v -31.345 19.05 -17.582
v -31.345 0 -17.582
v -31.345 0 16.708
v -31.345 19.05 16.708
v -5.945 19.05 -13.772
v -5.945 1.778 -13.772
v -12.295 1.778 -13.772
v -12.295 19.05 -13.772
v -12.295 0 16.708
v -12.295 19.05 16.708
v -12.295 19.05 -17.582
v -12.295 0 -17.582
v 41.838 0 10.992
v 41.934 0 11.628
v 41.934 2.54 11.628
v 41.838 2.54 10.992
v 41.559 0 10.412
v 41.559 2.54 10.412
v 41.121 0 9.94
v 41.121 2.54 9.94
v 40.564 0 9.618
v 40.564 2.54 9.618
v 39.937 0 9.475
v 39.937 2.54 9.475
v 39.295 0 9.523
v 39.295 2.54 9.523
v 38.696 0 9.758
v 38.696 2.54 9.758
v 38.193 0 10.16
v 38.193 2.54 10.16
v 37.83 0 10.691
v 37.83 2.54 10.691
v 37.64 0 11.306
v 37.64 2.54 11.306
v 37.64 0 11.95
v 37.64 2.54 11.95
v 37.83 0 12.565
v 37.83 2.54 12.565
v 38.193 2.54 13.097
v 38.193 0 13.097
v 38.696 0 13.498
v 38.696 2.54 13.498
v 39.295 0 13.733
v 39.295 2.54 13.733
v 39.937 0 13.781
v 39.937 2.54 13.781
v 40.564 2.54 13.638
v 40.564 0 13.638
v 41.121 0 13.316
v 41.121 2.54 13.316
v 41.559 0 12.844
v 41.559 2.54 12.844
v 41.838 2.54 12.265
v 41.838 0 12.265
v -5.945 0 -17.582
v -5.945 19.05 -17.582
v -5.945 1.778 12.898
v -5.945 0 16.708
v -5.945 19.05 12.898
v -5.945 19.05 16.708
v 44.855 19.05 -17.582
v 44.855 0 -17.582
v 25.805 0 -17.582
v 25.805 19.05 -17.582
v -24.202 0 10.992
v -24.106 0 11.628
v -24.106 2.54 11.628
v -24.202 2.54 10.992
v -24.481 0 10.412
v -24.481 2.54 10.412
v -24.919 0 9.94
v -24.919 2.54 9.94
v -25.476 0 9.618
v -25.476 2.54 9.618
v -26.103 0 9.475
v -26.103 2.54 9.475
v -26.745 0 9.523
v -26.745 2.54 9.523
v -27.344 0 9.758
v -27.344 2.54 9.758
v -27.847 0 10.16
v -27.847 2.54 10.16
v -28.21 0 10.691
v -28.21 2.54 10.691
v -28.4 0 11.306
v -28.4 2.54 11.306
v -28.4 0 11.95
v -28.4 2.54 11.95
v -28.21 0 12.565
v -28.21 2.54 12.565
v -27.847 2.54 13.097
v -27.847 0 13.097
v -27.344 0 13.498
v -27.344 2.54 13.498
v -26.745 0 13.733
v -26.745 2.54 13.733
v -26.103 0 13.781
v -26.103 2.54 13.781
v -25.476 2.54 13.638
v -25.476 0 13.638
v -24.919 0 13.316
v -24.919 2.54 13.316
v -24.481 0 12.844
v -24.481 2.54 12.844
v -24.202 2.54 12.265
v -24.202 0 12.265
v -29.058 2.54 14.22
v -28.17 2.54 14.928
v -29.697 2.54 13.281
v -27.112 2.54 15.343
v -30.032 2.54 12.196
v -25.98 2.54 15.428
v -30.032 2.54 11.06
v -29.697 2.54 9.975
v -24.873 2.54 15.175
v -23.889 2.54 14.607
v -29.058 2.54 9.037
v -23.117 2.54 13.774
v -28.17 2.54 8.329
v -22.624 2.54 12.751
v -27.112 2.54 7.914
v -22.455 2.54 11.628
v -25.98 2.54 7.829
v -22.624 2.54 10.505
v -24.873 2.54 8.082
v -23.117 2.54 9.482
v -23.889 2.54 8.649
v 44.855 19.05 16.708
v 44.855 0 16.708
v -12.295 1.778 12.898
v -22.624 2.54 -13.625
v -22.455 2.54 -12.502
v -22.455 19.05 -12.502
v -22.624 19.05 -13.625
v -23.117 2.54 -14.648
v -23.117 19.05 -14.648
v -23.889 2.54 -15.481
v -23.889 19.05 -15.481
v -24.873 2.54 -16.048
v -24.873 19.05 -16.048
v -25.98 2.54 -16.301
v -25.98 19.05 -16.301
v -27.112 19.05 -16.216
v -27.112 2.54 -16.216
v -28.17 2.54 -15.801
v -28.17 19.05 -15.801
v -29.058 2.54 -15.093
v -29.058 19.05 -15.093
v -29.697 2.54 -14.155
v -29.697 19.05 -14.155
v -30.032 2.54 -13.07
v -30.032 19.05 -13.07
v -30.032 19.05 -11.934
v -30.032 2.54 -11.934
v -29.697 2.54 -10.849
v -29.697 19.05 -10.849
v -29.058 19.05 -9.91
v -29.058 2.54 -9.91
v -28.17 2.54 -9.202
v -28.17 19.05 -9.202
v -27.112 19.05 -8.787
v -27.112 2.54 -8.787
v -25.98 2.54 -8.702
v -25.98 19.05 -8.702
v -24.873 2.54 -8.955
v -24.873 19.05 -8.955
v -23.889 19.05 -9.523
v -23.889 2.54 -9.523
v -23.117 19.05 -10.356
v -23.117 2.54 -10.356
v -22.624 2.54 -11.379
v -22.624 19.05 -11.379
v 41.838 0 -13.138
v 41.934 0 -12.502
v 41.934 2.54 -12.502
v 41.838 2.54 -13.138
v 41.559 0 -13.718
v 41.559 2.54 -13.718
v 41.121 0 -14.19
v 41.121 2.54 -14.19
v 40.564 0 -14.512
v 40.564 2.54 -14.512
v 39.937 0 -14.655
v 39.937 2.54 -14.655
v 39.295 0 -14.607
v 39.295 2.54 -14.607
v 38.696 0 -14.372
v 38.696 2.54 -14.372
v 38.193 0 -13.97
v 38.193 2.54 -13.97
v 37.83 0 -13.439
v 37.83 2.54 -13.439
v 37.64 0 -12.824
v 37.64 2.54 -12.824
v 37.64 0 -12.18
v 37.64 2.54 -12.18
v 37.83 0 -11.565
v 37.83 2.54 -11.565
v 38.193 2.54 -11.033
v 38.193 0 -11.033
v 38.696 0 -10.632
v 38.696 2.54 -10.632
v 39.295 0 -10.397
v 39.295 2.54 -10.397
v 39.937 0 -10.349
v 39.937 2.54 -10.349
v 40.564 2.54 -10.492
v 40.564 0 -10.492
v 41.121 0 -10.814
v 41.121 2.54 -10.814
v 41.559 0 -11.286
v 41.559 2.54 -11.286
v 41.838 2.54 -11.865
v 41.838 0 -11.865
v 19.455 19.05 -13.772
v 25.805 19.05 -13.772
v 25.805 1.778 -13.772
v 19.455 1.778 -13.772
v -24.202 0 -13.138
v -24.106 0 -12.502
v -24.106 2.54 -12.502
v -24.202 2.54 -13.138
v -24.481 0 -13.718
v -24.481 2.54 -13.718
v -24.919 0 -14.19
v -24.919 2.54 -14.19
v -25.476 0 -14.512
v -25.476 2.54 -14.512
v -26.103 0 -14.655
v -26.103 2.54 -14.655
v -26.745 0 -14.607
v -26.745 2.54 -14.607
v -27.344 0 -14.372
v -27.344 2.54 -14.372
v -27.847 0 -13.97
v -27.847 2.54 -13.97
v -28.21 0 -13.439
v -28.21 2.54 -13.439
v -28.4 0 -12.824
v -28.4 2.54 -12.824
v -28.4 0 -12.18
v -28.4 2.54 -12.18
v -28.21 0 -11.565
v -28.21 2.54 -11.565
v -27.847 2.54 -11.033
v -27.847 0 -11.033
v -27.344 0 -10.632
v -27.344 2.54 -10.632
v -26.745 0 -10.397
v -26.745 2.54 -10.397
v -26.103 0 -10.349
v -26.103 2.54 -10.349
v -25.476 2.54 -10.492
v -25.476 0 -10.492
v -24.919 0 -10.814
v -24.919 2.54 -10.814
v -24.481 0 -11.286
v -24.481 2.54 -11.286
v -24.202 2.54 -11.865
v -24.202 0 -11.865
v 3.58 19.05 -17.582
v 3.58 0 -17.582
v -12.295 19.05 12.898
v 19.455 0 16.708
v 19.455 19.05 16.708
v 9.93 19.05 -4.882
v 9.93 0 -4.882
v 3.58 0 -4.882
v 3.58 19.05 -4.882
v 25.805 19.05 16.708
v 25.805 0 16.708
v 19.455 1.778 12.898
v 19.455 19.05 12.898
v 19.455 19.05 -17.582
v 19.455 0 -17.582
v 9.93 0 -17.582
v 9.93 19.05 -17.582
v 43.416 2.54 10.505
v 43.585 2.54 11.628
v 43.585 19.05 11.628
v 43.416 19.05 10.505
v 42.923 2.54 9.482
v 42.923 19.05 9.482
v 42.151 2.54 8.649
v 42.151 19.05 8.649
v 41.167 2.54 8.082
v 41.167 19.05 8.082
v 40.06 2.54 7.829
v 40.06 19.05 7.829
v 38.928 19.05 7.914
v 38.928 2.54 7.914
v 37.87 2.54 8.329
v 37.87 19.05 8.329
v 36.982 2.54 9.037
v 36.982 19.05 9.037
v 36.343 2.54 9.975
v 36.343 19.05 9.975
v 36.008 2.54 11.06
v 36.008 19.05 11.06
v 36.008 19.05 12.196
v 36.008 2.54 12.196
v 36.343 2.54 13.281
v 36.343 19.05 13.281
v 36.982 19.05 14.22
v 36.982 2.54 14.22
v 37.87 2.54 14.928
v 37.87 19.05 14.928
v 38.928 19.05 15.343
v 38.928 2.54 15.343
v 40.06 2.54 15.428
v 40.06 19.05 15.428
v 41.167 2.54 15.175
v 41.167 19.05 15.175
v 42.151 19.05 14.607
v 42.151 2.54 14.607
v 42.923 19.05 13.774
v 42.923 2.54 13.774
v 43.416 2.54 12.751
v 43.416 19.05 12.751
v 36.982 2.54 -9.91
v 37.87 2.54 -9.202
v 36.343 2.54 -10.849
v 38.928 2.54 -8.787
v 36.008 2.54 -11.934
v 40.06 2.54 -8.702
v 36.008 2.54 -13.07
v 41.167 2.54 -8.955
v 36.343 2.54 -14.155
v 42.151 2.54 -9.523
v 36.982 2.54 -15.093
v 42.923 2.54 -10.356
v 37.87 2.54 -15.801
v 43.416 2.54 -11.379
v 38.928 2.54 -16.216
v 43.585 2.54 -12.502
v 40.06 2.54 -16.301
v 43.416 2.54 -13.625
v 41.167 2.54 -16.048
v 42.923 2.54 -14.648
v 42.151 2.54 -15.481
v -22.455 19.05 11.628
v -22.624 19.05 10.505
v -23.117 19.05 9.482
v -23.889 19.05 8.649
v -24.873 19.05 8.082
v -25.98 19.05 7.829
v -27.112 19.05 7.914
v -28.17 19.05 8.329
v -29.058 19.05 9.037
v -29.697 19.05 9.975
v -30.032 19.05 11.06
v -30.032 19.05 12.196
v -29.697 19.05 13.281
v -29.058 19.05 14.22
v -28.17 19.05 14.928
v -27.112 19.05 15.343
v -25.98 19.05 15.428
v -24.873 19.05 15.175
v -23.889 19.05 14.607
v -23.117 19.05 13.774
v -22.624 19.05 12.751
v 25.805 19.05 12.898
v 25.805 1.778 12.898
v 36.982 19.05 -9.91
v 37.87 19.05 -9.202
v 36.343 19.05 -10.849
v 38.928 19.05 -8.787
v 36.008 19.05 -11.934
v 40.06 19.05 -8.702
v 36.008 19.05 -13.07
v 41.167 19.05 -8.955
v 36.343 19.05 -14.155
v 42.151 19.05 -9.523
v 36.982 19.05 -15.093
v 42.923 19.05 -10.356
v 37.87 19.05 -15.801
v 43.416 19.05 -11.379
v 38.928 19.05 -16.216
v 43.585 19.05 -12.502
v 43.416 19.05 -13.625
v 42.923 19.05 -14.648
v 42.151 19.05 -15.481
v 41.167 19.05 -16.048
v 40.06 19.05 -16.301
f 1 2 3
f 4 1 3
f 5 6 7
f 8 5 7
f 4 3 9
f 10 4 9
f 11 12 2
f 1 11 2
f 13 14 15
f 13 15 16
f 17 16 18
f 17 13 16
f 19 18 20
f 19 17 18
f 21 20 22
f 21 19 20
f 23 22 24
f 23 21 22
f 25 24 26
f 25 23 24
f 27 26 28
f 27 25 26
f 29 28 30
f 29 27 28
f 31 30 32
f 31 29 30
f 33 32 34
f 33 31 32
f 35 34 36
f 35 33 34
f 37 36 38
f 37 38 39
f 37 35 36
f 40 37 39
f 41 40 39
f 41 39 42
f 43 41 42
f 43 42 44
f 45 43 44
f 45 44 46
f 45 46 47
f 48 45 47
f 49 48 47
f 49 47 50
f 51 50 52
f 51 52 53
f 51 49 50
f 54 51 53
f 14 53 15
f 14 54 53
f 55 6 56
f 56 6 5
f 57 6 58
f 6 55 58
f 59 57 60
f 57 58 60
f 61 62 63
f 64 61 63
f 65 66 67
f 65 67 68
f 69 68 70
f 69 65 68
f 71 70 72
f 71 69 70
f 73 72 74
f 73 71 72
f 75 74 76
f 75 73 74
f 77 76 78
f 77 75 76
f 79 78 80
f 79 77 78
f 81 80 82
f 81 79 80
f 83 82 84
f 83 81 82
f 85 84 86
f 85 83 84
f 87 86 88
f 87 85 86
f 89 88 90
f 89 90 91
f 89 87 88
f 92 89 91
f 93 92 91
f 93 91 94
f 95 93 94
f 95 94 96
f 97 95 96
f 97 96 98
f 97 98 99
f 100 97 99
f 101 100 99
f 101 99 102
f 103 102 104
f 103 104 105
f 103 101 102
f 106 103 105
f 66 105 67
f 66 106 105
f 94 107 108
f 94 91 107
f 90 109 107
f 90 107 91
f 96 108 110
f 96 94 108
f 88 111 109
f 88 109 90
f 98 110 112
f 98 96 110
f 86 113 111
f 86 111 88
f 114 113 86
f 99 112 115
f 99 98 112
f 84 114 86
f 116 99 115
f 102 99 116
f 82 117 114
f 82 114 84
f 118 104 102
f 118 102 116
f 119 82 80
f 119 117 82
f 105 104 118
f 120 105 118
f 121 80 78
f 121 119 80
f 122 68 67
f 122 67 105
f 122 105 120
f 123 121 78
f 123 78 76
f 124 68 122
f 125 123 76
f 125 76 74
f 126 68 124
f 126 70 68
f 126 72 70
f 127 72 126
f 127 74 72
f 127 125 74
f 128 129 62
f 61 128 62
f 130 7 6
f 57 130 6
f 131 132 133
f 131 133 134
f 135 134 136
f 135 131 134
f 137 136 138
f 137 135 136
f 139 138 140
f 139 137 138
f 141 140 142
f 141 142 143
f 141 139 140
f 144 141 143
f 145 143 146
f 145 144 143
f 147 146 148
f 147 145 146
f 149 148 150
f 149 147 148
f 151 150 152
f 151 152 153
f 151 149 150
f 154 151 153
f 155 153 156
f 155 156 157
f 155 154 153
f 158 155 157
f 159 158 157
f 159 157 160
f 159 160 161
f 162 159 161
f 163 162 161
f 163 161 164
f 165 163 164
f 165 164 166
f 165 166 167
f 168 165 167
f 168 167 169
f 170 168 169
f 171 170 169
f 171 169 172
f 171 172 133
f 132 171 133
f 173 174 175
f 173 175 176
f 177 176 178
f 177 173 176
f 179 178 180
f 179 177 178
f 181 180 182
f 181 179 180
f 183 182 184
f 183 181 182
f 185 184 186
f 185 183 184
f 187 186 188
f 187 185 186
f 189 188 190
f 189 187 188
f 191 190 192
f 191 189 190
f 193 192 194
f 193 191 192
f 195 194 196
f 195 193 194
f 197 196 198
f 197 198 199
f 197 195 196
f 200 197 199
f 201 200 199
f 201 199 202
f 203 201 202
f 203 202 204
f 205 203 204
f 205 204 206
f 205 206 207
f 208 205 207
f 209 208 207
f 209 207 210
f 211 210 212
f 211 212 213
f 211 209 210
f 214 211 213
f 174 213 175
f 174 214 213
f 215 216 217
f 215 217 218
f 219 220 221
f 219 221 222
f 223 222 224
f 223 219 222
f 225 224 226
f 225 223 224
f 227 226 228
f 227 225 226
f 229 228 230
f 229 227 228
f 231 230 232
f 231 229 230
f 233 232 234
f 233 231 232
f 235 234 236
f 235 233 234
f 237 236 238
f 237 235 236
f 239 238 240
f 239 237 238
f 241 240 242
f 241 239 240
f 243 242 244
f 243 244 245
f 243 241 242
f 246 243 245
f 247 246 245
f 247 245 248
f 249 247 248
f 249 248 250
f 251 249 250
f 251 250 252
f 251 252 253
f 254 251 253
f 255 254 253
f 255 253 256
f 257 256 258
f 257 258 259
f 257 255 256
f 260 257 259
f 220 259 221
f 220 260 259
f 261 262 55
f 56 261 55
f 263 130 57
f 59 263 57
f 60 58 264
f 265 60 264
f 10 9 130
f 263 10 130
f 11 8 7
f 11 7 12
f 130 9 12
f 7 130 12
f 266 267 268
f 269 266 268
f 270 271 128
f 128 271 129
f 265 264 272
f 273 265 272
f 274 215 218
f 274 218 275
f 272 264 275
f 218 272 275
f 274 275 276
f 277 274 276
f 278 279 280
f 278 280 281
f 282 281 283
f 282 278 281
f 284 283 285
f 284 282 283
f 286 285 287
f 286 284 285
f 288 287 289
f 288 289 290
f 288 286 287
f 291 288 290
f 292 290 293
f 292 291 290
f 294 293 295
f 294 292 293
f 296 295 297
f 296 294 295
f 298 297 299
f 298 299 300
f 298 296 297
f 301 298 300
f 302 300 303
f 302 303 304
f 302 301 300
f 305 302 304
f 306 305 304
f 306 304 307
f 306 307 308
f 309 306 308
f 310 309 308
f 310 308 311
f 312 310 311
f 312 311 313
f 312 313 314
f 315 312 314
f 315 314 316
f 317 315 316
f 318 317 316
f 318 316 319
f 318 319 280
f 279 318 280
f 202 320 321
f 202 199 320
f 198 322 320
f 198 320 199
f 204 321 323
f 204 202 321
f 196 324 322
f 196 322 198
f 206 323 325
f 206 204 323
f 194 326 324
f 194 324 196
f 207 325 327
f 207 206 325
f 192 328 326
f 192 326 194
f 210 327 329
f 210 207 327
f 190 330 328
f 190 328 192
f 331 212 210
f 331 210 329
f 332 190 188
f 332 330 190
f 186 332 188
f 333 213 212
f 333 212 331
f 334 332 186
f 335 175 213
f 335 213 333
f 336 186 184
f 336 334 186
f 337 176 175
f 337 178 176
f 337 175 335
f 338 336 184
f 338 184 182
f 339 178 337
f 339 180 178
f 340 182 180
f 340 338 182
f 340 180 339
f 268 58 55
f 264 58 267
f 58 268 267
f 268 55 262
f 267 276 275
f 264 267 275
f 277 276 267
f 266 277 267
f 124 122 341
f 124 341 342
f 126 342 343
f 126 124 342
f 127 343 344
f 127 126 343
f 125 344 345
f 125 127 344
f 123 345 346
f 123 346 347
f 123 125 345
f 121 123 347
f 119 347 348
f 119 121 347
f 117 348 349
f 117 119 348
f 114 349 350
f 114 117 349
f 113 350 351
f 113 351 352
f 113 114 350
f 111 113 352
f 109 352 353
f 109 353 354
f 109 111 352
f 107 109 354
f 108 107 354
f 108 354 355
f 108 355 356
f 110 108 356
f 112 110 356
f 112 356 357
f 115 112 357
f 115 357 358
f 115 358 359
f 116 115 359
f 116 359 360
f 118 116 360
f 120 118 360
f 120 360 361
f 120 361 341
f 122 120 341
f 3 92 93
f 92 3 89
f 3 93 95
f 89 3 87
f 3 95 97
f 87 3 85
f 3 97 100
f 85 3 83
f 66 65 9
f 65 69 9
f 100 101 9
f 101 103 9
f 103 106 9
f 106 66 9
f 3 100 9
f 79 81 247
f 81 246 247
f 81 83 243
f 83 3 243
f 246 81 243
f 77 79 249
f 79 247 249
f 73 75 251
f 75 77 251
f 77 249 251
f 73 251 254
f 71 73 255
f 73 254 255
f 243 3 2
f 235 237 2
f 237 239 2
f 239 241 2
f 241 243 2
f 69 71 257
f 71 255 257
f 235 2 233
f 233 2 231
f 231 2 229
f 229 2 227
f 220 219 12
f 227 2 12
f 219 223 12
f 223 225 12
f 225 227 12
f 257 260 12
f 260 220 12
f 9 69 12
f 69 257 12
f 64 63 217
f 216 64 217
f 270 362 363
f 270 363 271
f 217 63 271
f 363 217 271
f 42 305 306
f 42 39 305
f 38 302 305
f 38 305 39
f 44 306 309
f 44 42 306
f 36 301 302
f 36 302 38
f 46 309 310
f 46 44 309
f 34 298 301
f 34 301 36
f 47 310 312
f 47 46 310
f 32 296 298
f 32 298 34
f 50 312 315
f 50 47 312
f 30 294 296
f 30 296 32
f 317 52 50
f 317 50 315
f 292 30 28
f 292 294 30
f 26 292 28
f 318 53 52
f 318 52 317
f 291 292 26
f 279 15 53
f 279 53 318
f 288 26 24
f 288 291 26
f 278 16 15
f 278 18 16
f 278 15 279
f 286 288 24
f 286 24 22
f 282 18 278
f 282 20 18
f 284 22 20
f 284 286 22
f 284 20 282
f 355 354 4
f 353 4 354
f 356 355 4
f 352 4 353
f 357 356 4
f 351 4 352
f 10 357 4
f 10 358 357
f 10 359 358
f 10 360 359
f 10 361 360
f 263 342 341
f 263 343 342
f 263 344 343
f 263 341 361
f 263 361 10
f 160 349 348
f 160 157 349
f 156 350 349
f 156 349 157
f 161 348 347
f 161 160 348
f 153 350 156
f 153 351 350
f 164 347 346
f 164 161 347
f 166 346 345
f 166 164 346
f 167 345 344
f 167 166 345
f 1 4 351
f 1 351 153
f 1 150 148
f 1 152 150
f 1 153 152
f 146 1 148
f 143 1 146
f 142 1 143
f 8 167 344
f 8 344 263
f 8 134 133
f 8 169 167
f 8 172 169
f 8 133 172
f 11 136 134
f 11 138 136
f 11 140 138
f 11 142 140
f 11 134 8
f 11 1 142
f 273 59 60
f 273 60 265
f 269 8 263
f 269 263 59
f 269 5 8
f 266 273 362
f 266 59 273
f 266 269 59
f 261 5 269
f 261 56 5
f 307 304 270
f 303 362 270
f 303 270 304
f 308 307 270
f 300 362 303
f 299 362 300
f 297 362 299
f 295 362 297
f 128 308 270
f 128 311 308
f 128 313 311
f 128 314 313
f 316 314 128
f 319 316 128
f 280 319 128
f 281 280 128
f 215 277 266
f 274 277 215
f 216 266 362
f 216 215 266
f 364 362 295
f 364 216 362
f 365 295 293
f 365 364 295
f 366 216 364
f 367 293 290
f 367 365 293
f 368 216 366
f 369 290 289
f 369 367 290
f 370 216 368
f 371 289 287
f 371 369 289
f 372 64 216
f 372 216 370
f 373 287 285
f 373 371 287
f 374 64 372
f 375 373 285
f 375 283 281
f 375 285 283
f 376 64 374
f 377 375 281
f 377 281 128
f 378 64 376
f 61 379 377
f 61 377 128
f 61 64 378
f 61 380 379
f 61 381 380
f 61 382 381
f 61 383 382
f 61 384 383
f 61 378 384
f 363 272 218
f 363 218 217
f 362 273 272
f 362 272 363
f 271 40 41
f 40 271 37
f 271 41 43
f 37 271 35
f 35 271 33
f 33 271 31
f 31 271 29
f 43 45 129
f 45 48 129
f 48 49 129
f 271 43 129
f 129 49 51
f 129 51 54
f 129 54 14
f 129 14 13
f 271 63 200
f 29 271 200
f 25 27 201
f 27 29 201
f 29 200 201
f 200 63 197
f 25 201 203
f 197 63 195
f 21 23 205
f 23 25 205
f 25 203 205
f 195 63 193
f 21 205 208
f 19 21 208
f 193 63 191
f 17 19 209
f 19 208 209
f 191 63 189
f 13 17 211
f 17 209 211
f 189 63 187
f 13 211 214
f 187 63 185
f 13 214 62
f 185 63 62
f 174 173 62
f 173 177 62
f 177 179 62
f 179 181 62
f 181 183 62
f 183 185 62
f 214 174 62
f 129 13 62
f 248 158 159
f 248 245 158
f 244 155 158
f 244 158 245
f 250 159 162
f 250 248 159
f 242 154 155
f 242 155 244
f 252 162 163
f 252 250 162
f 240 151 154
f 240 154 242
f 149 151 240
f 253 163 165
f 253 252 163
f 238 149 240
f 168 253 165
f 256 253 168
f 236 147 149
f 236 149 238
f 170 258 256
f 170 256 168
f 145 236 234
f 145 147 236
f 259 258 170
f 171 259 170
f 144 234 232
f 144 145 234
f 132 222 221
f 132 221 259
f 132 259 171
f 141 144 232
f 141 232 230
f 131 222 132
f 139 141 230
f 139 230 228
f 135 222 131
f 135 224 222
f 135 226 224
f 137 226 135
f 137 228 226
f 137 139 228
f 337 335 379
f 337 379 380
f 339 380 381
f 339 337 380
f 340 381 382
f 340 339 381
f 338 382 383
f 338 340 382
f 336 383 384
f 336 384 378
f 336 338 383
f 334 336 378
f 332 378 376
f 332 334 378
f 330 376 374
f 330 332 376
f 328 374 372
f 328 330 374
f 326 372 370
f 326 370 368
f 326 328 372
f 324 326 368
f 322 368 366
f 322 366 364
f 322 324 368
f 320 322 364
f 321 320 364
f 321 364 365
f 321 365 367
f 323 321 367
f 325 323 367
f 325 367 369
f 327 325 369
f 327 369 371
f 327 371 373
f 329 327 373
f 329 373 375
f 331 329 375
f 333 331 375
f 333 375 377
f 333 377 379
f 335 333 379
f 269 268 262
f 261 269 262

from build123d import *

# Parameters (mm, degrees)
SKETCH1_R           = 3.81
BOSS_EXTRUDE1_DEPTH = 19.05
SKETCH1_3_R         = 3.81
SKETCH1_3_R_2       = 2.159
BOSS_EXTRUDE2_DEPTH = 2.54
SKETCH2_W           = 6.35
SKETCH2_H           = 1.778
CUT_EXTRUDE2_DEPTH  = 60.587802913


with BuildPart() as part:
    # Sketch1 → Boss-Extrude1 (new body)
    with BuildSketch(Plane(origin=(0, 0, 0), x_dir=(1, 0, 0), z_dir=(0, 1, 0))):
        Polygon((-12.294680851, 17.581843972), (-31.344680851, 17.581843972), (-31.344680851, -16.708156028), (-12.294680851, -16.708156028), (-12.294680851, -12.898156028), (-5.944680851, -12.898156028), (-5.944680851, -16.708156028), (19.455319149, -16.708156028), (19.455319149, -12.898156028), (25.805319149, -12.898156028), (25.805319149, -16.708156028), (44.855319149, -16.708156028), (44.855319149, 17.581843972), (25.805319149, 17.581843972), (25.805319149, 13.771843972), (19.455319149, 13.771843972), (19.455319149, 17.581843972), (9.930319149, 17.581843972), (9.930319149, 4.881843972), (3.580319149, 4.881843972), (3.580319149, 17.581843972), (-5.944680851, 17.581843972), (-5.944680851, 13.771843972), (-12.294680851, 13.771843972), align=None)
        with Locations((-26.264680851, 12.501843972)):
            Circle(SKETCH1_R, mode=Mode.SUBTRACT)
        with Locations((39.775319149, 12.501843972)):
            Circle(SKETCH1_R, mode=Mode.SUBTRACT)
        with Locations((39.775319149, -11.628156028)):
            Circle(SKETCH1_R, mode=Mode.SUBTRACT)
        with Locations((-26.264680851, -11.628156028)):
            Circle(SKETCH1_R, mode=Mode.SUBTRACT)
    extrude(amount=BOSS_EXTRUDE1_DEPTH)

    # Sketch1<3> → Boss-Extrude2 (add)
    # profile 1 of 4: a face of its own
    with BuildSketch(Plane(origin=(0, 0, 0), x_dir=(1, 0, 0), z_dir=(0, 1, 0))):
        with Locations((-26.264680851, 12.501843972)):
            Circle(SKETCH1_3_R)
        with Locations((-26.264680851, 12.501843972)):
            Circle(SKETCH1_3_R_2, mode=Mode.SUBTRACT)
    # profile 2 of 4: a face of its own
    with BuildSketch(Plane(origin=(0, 0, 0), x_dir=(1, 0, 0), z_dir=(0, 1, 0))):
        with Locations((39.775319149, 12.501843972)):
            Circle(SKETCH1_3_R)
        with Locations((39.775319149, 12.501843972)):
            Circle(SKETCH1_3_R_2, mode=Mode.SUBTRACT)
    # profile 3 of 4: a face of its own
    with BuildSketch(Plane(origin=(0, 0, 0), x_dir=(1, 0, 0), z_dir=(0, 1, 0))):
        with Locations((-26.264680851, -11.628156028)):
            Circle(SKETCH1_3_R)
        with Locations((-26.264680851, -11.628156028)):
            Circle(SKETCH1_3_R_2, mode=Mode.SUBTRACT)
    # profile 4 of 4: a face of its own
    with BuildSketch(Plane(origin=(0, 0, 0), x_dir=(1, 0, 0), z_dir=(0, 1, 0))):
        with Locations((39.775319149, -11.628156028)):
            Circle(SKETCH1_3_R)
        with Locations((39.775319149, -11.628156028)):
            Circle(SKETCH1_3_R_2, mode=Mode.SUBTRACT)
    extrude(amount=BOSS_EXTRUDE2_DEPTH)

    # Sketch2 → Cut-Extrude2 (cut, through all)
    with BuildSketch(Plane.XY.offset(16.708156028)):
        with Locations((-9.119680851, 0.889)):
            Rectangle(SKETCH2_W, SKETCH2_H)
        with Locations((22.630319149, 0.889)):
            Rectangle(SKETCH2_W, SKETCH2_H)
    extrude(amount=-CUT_EXTRUDE2_DEPTH, mode=Mode.SUBTRACT)


solid = part.part
